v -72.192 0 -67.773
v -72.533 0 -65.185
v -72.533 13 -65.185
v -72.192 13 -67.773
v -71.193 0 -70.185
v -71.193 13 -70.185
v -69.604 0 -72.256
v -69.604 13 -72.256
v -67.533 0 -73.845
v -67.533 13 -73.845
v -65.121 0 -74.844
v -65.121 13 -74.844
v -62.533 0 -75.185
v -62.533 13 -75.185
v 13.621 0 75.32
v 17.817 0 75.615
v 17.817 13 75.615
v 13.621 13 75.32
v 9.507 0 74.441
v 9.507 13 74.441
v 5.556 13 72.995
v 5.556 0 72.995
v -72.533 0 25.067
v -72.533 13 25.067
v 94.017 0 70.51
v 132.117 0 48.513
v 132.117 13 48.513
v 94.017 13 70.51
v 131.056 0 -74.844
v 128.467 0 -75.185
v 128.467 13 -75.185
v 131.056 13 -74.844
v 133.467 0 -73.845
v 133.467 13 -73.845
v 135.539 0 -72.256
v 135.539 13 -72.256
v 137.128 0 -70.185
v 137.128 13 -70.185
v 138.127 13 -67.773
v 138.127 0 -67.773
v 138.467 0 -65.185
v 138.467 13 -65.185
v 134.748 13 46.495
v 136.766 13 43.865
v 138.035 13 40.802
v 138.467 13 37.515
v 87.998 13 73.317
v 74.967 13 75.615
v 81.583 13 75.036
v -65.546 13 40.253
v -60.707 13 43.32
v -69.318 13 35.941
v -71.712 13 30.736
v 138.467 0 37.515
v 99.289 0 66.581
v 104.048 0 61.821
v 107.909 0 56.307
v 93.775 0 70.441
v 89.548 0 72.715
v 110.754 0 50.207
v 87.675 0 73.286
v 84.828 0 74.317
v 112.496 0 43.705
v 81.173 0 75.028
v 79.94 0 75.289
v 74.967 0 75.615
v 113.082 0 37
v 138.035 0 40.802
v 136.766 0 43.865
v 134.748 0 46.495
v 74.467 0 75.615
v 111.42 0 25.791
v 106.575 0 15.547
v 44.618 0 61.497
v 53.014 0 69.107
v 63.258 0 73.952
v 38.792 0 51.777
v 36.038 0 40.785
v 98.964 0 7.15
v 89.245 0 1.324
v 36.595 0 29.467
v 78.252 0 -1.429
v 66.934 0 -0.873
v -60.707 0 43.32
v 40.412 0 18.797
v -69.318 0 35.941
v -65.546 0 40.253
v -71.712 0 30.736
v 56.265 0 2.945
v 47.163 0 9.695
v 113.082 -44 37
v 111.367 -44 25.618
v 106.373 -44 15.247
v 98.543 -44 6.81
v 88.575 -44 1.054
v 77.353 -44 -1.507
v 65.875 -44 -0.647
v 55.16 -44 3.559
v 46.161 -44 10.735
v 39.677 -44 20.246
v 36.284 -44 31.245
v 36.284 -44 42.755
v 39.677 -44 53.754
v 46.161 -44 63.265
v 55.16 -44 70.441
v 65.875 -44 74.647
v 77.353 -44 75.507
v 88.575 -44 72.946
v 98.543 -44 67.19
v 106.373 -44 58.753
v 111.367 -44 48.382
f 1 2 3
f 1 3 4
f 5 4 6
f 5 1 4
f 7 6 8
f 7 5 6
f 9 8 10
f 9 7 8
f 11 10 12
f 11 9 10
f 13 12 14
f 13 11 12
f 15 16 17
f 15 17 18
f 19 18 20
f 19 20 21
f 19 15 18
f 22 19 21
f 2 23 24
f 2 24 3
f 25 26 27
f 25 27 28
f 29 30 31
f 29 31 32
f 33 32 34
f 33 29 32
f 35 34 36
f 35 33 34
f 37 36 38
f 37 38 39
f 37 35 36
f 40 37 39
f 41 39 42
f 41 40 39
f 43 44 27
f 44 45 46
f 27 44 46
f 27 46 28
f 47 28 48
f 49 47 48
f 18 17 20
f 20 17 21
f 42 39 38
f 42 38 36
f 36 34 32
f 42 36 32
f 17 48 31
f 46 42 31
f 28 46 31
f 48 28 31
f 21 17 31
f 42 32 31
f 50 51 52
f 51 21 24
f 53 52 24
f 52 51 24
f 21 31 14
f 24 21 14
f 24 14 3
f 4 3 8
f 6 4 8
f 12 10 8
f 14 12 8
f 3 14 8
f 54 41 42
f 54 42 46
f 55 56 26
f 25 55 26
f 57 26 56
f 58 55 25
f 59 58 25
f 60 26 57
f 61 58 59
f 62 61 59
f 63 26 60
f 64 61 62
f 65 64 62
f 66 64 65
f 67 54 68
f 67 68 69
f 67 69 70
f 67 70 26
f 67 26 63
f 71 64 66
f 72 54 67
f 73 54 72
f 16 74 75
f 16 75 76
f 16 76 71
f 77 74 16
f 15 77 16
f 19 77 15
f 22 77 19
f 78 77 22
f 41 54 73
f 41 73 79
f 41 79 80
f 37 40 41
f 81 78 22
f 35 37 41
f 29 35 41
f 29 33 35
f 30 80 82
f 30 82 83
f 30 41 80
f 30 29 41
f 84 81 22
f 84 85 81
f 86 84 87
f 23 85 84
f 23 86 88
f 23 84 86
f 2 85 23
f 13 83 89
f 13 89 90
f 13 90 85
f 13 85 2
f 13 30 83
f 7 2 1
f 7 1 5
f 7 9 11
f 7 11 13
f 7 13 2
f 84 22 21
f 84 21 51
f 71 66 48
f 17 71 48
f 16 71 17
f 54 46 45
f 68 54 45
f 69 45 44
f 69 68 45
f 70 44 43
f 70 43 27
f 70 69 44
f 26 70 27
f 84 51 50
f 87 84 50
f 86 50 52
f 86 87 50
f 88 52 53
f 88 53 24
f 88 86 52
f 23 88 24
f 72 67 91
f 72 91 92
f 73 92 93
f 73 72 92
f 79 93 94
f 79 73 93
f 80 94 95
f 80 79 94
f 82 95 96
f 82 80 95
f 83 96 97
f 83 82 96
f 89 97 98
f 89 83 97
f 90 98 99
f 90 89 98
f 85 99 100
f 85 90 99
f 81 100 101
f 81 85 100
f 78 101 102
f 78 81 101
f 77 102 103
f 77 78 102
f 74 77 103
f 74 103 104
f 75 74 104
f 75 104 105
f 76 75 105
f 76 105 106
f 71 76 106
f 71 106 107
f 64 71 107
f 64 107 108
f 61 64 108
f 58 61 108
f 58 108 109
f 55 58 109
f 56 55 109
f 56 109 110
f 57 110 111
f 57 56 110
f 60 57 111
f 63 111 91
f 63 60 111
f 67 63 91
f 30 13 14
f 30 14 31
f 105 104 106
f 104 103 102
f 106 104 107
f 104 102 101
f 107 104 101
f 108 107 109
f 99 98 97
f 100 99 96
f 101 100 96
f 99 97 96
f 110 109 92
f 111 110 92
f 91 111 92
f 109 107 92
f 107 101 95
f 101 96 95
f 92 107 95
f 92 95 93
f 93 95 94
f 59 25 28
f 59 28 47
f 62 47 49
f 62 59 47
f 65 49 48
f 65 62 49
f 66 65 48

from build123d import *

# Parameters (mm, degrees)
BOSS_EXTRUDE2_DEPTH = 13
SKETCH3_R           = 38.614889052
BOSS_EXTRUDE3_DEPTH = 44


with BuildPart() as part:
    # Sketch1 → Boss-Extrude2 (new body)
    with BuildSketch(Plane(origin=(0, 0, 0), x_dir=(1, 0, 0), z_dir=(0, 1, 0))):
        with BuildLine():
            Line((132.11743751, -48.51341168), (94.01743751, -70.510456937))
            ThreePointArc((94.01743751, -70.510456937), (84.828443129, -74.316663034), (74.96743751, -75.614889052))
            Line((74.96743751, -75.614889052), (17.81743751, -75.614889052))
            ThreePointArc((17.81743751, -75.614889052), (11.548173881, -74.952515636), (5.555749824, -72.994644622))
            Line((5.555749824, -72.994644622), (-60.707020947, -43.319675524))
            ThreePointArc((-60.707020947, -43.319675524), (-69.317811507, -35.941035728), (-72.53256249, -25.066505144))
            Line((-72.53256249, -25.066505144), (-72.53256249, 65.185110948))
            ThreePointArc((-72.53256249, 65.185110948), (-69.603630301, 72.256178759), (-62.53256249, 75.185110948))
            Line((-62.53256249, 75.185110948), (128.46743751, 75.185110948))
            ThreePointArc((128.46743751, 75.185110948), (135.538505322, 72.256178759), (138.46743751, 65.185110948))
            Line((138.46743751, 65.185110948), (138.46743751, -37.514889052))
            ThreePointArc((138.46743751, -37.514889052), (136.765960139, -43.864889052), (132.11743751, -48.51341168))
        make_face()
    extrude(amount=BOSS_EXTRUDE2_DEPTH)

    # Sketch3 → Boss-Extrude3 (add)
    with BuildSketch(Plane(origin=(0, 0, 0), x_dir=(1, 0, 0), z_dir=(0, 1, 0))):
        with Locations((74.46743751, -37)):
            Circle(SKETCH3_R)
    extrude(amount=-BOSS_EXTRUDE3_DEPTH)


solid = part.part
